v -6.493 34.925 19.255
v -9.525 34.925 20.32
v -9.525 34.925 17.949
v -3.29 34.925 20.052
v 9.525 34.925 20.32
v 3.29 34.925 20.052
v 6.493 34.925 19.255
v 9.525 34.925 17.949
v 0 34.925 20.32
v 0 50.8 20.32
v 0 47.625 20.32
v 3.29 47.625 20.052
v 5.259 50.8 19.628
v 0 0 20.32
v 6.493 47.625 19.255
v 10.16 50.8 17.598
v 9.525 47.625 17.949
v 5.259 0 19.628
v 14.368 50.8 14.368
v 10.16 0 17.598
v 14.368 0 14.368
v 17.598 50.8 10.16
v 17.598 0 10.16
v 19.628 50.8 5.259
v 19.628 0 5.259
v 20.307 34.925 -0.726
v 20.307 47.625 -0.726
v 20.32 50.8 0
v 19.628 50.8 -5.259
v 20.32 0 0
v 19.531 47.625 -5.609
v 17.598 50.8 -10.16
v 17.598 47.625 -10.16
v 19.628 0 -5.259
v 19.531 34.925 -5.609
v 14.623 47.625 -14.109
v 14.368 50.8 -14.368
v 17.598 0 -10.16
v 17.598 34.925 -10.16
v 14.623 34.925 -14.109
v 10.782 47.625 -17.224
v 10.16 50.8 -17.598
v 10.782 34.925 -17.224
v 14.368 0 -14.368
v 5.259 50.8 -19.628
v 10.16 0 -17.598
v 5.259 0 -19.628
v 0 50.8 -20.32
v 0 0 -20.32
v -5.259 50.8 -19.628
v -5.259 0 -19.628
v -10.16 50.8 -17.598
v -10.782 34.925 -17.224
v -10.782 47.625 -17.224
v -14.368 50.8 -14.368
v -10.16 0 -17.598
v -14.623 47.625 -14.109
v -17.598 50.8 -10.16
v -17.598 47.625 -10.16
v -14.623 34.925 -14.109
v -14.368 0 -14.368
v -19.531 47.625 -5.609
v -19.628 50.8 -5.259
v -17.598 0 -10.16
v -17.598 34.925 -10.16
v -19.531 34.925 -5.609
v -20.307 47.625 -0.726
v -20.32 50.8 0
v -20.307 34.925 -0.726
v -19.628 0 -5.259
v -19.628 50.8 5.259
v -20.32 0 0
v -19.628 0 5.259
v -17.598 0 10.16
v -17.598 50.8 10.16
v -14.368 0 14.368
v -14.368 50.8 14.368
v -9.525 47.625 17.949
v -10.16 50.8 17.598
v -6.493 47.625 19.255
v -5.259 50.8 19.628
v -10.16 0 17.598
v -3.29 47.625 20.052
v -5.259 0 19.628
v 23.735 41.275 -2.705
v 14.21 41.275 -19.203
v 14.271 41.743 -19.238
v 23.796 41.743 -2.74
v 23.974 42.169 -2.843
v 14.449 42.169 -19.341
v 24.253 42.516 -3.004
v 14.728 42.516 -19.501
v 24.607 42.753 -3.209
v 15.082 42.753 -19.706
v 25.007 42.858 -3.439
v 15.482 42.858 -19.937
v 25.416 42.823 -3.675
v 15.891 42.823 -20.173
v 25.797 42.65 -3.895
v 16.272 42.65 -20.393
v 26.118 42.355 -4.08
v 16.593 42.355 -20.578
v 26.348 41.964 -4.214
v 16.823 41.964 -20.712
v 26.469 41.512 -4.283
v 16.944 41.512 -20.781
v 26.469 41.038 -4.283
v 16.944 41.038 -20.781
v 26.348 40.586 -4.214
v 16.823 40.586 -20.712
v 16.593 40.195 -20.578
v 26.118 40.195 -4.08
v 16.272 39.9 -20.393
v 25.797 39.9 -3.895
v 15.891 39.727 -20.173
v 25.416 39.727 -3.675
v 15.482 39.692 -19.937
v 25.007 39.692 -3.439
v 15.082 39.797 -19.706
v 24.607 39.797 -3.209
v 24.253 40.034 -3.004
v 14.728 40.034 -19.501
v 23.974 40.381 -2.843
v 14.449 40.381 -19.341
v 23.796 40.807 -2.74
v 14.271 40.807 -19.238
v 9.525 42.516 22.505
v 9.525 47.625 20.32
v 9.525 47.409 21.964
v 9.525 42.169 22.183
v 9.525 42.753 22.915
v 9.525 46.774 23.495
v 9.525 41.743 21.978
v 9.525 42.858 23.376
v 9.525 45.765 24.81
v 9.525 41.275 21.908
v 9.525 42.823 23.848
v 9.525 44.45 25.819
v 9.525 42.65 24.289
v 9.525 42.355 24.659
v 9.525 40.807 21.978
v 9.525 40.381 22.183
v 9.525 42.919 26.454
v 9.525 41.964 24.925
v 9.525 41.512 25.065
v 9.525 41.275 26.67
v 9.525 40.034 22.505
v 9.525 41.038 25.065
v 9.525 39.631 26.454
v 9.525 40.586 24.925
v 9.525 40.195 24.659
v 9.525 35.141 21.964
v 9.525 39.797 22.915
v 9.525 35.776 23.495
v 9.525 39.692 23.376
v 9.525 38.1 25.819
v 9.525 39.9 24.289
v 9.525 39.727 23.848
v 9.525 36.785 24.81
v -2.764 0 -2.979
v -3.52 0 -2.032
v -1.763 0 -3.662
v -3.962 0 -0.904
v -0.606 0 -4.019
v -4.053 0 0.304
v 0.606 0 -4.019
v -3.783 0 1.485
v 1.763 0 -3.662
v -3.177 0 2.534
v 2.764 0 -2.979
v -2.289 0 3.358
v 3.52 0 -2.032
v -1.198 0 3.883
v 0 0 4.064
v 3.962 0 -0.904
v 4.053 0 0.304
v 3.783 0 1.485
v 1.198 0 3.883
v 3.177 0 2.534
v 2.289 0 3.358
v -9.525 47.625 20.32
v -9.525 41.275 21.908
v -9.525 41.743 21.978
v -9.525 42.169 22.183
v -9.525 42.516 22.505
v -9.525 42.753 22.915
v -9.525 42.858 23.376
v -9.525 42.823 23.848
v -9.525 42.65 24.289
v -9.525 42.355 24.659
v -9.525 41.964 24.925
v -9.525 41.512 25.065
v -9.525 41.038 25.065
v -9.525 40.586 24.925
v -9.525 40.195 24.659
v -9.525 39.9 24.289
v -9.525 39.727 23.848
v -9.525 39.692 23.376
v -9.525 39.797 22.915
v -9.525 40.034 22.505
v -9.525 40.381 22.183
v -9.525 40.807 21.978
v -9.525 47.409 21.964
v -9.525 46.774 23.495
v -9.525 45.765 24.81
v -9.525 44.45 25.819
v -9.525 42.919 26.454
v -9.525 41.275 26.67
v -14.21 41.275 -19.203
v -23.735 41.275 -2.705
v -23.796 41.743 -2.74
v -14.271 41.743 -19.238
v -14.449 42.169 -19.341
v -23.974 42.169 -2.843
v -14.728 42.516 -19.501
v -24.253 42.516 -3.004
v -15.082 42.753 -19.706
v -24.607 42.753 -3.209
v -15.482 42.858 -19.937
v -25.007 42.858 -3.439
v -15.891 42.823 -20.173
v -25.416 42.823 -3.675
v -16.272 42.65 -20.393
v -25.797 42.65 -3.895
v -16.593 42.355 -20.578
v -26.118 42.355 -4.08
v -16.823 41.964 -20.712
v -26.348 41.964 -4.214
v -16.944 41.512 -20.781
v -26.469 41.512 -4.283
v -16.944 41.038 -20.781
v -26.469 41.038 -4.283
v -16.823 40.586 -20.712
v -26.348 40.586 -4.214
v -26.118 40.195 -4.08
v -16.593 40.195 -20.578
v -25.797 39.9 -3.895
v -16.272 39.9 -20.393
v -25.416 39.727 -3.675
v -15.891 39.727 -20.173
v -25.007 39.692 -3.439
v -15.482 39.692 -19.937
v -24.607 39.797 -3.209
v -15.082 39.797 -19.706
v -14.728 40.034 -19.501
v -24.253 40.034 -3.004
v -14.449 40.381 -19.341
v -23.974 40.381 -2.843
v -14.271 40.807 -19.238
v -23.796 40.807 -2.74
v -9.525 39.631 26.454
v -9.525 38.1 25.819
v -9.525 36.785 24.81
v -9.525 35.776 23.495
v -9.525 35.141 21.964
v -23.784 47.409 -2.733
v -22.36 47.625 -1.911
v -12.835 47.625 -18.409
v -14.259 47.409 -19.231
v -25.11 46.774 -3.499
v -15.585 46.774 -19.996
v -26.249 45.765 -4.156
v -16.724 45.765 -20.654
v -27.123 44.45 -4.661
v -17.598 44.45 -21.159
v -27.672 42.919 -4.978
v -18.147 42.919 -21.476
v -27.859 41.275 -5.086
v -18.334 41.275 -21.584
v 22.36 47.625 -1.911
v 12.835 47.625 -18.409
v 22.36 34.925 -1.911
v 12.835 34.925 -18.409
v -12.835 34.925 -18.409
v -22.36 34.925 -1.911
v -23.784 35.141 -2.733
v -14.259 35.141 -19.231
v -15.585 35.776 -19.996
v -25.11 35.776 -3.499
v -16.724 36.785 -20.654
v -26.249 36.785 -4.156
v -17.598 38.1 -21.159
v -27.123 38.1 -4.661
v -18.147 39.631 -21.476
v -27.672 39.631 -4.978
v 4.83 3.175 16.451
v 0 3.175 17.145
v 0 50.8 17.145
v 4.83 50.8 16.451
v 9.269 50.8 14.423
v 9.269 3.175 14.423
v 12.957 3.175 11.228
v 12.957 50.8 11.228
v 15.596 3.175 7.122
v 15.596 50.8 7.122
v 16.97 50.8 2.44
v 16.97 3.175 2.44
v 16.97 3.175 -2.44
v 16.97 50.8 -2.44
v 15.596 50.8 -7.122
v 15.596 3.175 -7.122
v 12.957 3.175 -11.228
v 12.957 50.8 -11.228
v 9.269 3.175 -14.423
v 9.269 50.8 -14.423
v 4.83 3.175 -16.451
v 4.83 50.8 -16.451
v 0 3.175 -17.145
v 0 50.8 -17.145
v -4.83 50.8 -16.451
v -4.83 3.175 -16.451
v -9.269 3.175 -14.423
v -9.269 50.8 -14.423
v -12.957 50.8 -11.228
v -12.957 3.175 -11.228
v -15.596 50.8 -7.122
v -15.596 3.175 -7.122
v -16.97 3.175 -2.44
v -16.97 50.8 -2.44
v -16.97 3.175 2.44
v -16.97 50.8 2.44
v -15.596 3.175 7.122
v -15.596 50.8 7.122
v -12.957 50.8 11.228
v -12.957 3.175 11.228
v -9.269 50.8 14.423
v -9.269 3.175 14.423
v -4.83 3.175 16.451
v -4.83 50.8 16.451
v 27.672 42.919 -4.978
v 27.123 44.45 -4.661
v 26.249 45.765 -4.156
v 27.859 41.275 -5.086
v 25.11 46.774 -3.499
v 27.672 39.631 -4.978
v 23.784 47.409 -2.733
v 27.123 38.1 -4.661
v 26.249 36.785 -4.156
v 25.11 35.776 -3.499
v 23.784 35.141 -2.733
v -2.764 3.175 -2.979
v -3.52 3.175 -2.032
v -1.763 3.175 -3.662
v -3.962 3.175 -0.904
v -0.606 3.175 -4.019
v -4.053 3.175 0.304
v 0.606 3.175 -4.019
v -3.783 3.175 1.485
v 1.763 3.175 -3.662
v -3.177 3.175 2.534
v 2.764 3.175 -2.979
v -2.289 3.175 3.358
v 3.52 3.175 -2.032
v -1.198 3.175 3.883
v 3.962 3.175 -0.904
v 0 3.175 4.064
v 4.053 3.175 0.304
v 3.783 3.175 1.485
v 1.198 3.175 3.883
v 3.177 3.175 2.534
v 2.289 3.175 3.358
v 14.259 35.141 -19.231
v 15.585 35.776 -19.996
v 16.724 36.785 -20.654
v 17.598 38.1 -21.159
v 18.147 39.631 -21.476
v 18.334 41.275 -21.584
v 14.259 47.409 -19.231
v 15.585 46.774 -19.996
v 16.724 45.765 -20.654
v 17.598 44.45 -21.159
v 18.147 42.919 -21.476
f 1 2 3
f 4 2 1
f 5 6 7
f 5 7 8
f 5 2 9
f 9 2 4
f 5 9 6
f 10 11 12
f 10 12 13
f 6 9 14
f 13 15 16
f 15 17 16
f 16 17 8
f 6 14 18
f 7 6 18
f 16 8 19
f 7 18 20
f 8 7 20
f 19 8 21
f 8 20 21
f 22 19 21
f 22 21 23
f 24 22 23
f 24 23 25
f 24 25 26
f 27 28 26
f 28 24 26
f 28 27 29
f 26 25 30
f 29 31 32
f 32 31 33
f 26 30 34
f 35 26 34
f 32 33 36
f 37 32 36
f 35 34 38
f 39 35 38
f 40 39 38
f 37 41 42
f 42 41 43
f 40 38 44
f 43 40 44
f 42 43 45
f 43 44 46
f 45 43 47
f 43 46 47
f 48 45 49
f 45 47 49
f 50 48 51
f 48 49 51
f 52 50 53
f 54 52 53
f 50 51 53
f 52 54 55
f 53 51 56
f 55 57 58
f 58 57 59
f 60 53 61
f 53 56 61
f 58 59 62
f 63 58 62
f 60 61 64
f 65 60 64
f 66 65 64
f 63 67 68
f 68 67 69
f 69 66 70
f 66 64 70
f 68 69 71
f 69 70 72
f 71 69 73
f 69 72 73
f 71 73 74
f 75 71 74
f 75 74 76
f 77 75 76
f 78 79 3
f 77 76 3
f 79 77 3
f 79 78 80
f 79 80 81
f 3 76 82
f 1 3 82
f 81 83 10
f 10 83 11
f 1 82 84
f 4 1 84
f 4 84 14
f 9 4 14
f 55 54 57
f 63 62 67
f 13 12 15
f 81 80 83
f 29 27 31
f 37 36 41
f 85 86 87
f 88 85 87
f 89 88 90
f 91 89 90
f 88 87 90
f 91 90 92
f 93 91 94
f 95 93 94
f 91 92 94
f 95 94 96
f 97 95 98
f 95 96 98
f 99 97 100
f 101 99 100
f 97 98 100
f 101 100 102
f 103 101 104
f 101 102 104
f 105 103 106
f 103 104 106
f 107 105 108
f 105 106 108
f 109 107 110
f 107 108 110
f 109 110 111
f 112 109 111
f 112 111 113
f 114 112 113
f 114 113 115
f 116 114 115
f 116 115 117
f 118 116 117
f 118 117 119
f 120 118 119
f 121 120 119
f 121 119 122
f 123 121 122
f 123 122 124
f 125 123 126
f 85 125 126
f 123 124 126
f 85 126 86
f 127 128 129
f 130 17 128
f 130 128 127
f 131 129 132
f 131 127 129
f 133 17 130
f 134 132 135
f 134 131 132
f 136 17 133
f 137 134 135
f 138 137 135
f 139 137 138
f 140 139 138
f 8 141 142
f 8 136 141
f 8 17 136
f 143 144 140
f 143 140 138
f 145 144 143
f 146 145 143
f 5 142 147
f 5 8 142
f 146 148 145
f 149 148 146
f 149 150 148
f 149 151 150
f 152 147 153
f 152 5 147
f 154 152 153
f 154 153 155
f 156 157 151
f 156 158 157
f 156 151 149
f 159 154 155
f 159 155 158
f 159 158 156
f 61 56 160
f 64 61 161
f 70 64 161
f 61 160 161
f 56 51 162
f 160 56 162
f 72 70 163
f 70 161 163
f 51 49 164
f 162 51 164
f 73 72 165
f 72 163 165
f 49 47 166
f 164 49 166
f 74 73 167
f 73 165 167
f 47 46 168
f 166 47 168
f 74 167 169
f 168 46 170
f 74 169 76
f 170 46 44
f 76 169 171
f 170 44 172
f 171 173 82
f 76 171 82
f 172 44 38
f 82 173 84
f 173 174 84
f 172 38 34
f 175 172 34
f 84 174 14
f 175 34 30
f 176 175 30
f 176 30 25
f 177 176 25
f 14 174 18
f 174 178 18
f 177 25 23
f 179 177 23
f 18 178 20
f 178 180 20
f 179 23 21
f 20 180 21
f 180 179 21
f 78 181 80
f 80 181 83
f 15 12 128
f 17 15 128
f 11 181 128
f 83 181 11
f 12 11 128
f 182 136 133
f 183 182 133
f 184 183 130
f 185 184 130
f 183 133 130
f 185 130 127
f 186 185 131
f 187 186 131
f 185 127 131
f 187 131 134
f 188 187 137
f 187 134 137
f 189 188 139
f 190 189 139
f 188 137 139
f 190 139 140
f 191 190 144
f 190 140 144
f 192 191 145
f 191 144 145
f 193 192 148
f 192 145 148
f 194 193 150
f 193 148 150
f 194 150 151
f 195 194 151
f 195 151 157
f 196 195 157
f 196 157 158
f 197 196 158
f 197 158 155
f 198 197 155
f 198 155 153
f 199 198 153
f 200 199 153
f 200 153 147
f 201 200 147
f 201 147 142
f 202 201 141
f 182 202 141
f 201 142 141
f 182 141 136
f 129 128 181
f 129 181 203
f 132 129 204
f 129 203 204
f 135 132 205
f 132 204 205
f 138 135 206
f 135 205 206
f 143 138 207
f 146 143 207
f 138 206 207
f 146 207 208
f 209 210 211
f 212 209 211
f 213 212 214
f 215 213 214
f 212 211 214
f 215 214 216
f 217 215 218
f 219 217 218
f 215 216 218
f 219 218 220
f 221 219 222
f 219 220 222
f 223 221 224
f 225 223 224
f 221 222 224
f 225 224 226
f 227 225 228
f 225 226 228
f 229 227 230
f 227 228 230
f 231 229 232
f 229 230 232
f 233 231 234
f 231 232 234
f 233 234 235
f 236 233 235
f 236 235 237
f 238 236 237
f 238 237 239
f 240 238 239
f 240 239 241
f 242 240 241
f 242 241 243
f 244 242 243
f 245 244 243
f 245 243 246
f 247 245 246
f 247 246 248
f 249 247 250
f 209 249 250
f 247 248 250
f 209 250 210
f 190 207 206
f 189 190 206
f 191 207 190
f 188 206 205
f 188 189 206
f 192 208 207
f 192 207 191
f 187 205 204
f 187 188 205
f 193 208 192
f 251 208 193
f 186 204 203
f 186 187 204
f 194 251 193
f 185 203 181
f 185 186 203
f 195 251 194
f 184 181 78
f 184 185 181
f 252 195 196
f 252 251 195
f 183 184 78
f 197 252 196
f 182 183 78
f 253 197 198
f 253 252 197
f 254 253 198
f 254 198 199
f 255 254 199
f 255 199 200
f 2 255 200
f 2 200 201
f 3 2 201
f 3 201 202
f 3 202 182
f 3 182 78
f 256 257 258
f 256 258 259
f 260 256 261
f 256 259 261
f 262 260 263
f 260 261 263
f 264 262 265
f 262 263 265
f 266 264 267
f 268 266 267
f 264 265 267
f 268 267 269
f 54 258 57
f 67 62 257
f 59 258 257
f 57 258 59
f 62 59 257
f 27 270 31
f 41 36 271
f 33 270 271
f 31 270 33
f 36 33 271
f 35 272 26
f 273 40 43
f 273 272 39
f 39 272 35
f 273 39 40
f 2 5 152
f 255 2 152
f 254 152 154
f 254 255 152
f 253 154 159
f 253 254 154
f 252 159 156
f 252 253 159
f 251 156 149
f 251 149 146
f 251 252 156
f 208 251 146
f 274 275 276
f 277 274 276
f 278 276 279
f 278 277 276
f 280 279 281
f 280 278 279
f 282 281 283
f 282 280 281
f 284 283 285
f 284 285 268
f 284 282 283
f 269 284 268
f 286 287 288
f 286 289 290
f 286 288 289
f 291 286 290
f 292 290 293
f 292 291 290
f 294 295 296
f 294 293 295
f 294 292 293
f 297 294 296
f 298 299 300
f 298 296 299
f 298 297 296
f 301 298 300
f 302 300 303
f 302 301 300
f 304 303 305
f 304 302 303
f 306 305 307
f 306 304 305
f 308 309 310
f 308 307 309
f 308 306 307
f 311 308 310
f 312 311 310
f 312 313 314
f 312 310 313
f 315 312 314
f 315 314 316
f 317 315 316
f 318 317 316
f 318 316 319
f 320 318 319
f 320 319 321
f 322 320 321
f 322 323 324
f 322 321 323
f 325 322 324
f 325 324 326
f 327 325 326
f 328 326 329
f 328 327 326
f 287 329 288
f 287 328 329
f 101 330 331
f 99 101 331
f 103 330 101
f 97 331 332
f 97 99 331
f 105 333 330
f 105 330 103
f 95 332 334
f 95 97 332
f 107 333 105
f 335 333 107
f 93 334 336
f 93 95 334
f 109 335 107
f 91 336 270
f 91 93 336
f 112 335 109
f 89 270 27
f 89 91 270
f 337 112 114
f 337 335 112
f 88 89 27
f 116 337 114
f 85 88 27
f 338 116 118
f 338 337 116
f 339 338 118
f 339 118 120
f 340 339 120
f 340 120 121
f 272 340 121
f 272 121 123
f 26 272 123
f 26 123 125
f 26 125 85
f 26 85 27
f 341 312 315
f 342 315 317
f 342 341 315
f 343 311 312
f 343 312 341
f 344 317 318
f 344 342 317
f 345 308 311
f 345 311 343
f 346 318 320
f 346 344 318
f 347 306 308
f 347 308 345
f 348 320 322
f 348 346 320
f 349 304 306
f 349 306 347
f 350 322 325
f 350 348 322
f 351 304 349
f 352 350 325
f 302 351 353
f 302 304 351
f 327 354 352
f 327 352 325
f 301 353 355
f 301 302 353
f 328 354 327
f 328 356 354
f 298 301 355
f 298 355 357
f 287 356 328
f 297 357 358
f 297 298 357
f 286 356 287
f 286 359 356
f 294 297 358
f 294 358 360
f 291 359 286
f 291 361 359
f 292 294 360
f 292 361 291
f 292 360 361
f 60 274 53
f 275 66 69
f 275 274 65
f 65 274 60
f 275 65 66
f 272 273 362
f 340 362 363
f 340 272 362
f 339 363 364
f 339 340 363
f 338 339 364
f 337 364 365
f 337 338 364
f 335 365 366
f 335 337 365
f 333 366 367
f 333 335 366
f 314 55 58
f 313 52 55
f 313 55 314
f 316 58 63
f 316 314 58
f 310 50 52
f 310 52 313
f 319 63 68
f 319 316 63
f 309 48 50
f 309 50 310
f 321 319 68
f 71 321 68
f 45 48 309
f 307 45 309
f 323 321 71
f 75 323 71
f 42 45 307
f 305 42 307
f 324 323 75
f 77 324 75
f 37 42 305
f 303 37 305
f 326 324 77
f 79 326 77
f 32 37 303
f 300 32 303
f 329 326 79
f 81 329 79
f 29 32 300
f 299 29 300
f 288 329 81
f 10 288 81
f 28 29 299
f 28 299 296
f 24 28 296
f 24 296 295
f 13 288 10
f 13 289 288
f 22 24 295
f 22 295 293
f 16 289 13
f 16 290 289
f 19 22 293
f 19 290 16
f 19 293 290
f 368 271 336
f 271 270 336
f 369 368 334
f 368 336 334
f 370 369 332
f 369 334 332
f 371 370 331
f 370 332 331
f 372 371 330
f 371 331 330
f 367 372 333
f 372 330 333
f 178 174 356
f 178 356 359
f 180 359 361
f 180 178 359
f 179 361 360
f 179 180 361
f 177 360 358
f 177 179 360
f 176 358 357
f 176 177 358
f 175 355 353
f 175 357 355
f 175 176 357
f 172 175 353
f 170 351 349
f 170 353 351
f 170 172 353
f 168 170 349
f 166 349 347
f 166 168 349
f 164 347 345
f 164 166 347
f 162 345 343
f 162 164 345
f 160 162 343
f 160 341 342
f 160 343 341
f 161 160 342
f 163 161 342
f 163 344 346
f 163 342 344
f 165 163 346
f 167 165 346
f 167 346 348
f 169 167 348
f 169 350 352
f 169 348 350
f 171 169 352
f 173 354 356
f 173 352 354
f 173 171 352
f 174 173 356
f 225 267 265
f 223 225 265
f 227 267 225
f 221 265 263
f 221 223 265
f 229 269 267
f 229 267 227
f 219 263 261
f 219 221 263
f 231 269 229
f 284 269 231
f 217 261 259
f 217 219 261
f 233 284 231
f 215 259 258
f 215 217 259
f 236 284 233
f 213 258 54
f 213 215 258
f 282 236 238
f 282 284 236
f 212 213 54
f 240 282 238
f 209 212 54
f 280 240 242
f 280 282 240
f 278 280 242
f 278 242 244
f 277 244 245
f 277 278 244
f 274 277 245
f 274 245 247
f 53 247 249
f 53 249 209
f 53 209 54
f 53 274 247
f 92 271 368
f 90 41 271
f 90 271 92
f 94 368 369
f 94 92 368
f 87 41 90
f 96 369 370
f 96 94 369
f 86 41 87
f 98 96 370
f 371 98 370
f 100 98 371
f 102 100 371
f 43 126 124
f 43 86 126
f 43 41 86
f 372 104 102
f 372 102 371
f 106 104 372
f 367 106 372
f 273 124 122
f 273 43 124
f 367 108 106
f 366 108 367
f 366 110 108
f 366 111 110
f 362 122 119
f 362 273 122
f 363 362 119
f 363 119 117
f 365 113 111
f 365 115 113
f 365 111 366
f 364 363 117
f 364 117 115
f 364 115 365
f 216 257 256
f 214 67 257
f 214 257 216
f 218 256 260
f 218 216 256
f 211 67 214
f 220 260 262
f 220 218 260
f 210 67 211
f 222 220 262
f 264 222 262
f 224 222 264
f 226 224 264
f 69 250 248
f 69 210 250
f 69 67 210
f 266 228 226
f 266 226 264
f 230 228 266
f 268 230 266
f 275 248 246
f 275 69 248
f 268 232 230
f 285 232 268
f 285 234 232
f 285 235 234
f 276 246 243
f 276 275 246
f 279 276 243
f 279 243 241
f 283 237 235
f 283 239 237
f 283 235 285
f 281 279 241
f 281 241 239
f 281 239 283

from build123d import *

# Parameters (mm, degrees)
SKETCH1_R                = 20.32
BOSS_EXTRUDE1_DEPTH      = 50.8
SHELL1_T                 = -3.175
CUT_EXTRUDE1_DEPTH       = 56.623245366
CUT_EXTRUDE1_DEPTH_BACK  = 46.482
SKETCH2_R                = 4.064
BOSS_EXTRUDE2_START      = -34.925
BOSS_EXTRUDE2_DEPTH      = 12.7
SKETCH4_R                = 1.5875
CUT_EXTRUDE2_DEPTH       = 19.05
FILLET1_R                = 6.35
CIRPATTERN1_COUNT        = 3
FILLET1_OF_CIRPATTERN1_R = 6.35


with BuildPart() as part:
    # Sketch1 → Boss-Extrude1 (new body)
    with BuildSketch(Plane(origin=(0, 0, 0), x_dir=(1, 0, 0), z_dir=(0, 1, 0))):
        with Locations(Location((0, 0, 0), (0, 0, 270))):
            Circle(SKETCH1_R)
    extrude(amount=BOSS_EXTRUDE1_DEPTH)

    # Shell1
    shell1_openings = [part.faces().sort_by_distance(p)[0] for p in [
        (0, 50.8, 0),
    ]]
    offset(amount=SHELL1_T, openings=shell1_openings, kind=Kind.INTERSECTION)

    # Sketch2 → Cut-Extrude1 (cut, two sides: drawn at the far end of the back side and taken through both)
    with BuildSketch(Plane(origin=(0, 3.175, 0), x_dir=(1, 0, 0), z_dir=(0, 1, 0)).offset(-CUT_EXTRUDE1_DEPTH_BACK)):
        with Locations(Location((0, 0, 0), (0, 0, 270))):
            Circle(SKETCH2_R)
    extrude(amount=CUT_EXTRUDE1_DEPTH + CUT_EXTRUDE1_DEPTH_BACK, mode=Mode.SUBTRACT)

    # Sketch3 → Boss-Extrude2 (add)
    with BuildSketch(Plane.XZ.offset(BOSS_EXTRUDE2_START)):
        with BuildLine():
            ThreePointArc((-9.525, 17.949283412), (0, 20.32), (9.525, 17.949283412))
            Line((9.525, 17.949283412), (9.525, 26.67))
            Line((9.525, 26.67), (-9.525, 26.67))
            Line((-9.525, 26.67), (-9.525, 17.949283412))
        make_face()
    boss_extrude2 = extrude(amount=-BOSS_EXTRUDE2_DEPTH)

    # Sketch4 → Cut-Extrude2 (cut)
    with BuildSketch(Plane(origin=(9.525, 0, 0), x_dir=(0, 0, -1), z_dir=(1, 0, 0))):
        with Locations((-23.495, 41.275)):
            Circle(SKETCH4_R)
    cut_extrude2 = extrude(amount=-CUT_EXTRUDE2_DEPTH, mode=Mode.SUBTRACT)

    # Fillet1
    fillet1_edges = [part.edges().sort_by_distance(p)[0] for p in [
        (0, 47.625, 26.67),
        (0, 34.925, 26.67),
    ]]
    fillet(fillet1_edges, radius=FILLET1_R - 0.0001)  # a hair under: the kernel refuses the full size

    # CirPattern1: Boss-Extrude2, Cut-Extrude2 ×3 about axis
    cirpattern1_axis = Axis((0, 0, 0), (0, 1, 0))
    add([boss_extrude2.rotate(cirpattern1_axis, i * 360 / CIRPATTERN1_COUNT) for i in range(1, CIRPATTERN1_COUNT)])
    add([cut_extrude2.rotate(cirpattern1_axis, i * 360 / CIRPATTERN1_COUNT) for i in range(1, CIRPATTERN1_COUNT)], mode=Mode.SUBTRACT)

    # Fillet1 of CirPattern1
    fillet1_of_cirpattern1_edges = [part.edges().sort_by_distance(p)[0] for p in [
        (23.096897519, 47.625, -13.335),
        (23.096897519, 34.925, -13.335),
        (-23.096897519, 47.625, -13.335),
        (-23.096897519, 34.925, -13.335),
    ]]
    fillet(fillet1_of_cirpattern1_edges, radius=FILLET1_OF_CIRPATTERN1_R - 0.0001)  # a hair under: the kernel refuses the full size


solid = part.part
